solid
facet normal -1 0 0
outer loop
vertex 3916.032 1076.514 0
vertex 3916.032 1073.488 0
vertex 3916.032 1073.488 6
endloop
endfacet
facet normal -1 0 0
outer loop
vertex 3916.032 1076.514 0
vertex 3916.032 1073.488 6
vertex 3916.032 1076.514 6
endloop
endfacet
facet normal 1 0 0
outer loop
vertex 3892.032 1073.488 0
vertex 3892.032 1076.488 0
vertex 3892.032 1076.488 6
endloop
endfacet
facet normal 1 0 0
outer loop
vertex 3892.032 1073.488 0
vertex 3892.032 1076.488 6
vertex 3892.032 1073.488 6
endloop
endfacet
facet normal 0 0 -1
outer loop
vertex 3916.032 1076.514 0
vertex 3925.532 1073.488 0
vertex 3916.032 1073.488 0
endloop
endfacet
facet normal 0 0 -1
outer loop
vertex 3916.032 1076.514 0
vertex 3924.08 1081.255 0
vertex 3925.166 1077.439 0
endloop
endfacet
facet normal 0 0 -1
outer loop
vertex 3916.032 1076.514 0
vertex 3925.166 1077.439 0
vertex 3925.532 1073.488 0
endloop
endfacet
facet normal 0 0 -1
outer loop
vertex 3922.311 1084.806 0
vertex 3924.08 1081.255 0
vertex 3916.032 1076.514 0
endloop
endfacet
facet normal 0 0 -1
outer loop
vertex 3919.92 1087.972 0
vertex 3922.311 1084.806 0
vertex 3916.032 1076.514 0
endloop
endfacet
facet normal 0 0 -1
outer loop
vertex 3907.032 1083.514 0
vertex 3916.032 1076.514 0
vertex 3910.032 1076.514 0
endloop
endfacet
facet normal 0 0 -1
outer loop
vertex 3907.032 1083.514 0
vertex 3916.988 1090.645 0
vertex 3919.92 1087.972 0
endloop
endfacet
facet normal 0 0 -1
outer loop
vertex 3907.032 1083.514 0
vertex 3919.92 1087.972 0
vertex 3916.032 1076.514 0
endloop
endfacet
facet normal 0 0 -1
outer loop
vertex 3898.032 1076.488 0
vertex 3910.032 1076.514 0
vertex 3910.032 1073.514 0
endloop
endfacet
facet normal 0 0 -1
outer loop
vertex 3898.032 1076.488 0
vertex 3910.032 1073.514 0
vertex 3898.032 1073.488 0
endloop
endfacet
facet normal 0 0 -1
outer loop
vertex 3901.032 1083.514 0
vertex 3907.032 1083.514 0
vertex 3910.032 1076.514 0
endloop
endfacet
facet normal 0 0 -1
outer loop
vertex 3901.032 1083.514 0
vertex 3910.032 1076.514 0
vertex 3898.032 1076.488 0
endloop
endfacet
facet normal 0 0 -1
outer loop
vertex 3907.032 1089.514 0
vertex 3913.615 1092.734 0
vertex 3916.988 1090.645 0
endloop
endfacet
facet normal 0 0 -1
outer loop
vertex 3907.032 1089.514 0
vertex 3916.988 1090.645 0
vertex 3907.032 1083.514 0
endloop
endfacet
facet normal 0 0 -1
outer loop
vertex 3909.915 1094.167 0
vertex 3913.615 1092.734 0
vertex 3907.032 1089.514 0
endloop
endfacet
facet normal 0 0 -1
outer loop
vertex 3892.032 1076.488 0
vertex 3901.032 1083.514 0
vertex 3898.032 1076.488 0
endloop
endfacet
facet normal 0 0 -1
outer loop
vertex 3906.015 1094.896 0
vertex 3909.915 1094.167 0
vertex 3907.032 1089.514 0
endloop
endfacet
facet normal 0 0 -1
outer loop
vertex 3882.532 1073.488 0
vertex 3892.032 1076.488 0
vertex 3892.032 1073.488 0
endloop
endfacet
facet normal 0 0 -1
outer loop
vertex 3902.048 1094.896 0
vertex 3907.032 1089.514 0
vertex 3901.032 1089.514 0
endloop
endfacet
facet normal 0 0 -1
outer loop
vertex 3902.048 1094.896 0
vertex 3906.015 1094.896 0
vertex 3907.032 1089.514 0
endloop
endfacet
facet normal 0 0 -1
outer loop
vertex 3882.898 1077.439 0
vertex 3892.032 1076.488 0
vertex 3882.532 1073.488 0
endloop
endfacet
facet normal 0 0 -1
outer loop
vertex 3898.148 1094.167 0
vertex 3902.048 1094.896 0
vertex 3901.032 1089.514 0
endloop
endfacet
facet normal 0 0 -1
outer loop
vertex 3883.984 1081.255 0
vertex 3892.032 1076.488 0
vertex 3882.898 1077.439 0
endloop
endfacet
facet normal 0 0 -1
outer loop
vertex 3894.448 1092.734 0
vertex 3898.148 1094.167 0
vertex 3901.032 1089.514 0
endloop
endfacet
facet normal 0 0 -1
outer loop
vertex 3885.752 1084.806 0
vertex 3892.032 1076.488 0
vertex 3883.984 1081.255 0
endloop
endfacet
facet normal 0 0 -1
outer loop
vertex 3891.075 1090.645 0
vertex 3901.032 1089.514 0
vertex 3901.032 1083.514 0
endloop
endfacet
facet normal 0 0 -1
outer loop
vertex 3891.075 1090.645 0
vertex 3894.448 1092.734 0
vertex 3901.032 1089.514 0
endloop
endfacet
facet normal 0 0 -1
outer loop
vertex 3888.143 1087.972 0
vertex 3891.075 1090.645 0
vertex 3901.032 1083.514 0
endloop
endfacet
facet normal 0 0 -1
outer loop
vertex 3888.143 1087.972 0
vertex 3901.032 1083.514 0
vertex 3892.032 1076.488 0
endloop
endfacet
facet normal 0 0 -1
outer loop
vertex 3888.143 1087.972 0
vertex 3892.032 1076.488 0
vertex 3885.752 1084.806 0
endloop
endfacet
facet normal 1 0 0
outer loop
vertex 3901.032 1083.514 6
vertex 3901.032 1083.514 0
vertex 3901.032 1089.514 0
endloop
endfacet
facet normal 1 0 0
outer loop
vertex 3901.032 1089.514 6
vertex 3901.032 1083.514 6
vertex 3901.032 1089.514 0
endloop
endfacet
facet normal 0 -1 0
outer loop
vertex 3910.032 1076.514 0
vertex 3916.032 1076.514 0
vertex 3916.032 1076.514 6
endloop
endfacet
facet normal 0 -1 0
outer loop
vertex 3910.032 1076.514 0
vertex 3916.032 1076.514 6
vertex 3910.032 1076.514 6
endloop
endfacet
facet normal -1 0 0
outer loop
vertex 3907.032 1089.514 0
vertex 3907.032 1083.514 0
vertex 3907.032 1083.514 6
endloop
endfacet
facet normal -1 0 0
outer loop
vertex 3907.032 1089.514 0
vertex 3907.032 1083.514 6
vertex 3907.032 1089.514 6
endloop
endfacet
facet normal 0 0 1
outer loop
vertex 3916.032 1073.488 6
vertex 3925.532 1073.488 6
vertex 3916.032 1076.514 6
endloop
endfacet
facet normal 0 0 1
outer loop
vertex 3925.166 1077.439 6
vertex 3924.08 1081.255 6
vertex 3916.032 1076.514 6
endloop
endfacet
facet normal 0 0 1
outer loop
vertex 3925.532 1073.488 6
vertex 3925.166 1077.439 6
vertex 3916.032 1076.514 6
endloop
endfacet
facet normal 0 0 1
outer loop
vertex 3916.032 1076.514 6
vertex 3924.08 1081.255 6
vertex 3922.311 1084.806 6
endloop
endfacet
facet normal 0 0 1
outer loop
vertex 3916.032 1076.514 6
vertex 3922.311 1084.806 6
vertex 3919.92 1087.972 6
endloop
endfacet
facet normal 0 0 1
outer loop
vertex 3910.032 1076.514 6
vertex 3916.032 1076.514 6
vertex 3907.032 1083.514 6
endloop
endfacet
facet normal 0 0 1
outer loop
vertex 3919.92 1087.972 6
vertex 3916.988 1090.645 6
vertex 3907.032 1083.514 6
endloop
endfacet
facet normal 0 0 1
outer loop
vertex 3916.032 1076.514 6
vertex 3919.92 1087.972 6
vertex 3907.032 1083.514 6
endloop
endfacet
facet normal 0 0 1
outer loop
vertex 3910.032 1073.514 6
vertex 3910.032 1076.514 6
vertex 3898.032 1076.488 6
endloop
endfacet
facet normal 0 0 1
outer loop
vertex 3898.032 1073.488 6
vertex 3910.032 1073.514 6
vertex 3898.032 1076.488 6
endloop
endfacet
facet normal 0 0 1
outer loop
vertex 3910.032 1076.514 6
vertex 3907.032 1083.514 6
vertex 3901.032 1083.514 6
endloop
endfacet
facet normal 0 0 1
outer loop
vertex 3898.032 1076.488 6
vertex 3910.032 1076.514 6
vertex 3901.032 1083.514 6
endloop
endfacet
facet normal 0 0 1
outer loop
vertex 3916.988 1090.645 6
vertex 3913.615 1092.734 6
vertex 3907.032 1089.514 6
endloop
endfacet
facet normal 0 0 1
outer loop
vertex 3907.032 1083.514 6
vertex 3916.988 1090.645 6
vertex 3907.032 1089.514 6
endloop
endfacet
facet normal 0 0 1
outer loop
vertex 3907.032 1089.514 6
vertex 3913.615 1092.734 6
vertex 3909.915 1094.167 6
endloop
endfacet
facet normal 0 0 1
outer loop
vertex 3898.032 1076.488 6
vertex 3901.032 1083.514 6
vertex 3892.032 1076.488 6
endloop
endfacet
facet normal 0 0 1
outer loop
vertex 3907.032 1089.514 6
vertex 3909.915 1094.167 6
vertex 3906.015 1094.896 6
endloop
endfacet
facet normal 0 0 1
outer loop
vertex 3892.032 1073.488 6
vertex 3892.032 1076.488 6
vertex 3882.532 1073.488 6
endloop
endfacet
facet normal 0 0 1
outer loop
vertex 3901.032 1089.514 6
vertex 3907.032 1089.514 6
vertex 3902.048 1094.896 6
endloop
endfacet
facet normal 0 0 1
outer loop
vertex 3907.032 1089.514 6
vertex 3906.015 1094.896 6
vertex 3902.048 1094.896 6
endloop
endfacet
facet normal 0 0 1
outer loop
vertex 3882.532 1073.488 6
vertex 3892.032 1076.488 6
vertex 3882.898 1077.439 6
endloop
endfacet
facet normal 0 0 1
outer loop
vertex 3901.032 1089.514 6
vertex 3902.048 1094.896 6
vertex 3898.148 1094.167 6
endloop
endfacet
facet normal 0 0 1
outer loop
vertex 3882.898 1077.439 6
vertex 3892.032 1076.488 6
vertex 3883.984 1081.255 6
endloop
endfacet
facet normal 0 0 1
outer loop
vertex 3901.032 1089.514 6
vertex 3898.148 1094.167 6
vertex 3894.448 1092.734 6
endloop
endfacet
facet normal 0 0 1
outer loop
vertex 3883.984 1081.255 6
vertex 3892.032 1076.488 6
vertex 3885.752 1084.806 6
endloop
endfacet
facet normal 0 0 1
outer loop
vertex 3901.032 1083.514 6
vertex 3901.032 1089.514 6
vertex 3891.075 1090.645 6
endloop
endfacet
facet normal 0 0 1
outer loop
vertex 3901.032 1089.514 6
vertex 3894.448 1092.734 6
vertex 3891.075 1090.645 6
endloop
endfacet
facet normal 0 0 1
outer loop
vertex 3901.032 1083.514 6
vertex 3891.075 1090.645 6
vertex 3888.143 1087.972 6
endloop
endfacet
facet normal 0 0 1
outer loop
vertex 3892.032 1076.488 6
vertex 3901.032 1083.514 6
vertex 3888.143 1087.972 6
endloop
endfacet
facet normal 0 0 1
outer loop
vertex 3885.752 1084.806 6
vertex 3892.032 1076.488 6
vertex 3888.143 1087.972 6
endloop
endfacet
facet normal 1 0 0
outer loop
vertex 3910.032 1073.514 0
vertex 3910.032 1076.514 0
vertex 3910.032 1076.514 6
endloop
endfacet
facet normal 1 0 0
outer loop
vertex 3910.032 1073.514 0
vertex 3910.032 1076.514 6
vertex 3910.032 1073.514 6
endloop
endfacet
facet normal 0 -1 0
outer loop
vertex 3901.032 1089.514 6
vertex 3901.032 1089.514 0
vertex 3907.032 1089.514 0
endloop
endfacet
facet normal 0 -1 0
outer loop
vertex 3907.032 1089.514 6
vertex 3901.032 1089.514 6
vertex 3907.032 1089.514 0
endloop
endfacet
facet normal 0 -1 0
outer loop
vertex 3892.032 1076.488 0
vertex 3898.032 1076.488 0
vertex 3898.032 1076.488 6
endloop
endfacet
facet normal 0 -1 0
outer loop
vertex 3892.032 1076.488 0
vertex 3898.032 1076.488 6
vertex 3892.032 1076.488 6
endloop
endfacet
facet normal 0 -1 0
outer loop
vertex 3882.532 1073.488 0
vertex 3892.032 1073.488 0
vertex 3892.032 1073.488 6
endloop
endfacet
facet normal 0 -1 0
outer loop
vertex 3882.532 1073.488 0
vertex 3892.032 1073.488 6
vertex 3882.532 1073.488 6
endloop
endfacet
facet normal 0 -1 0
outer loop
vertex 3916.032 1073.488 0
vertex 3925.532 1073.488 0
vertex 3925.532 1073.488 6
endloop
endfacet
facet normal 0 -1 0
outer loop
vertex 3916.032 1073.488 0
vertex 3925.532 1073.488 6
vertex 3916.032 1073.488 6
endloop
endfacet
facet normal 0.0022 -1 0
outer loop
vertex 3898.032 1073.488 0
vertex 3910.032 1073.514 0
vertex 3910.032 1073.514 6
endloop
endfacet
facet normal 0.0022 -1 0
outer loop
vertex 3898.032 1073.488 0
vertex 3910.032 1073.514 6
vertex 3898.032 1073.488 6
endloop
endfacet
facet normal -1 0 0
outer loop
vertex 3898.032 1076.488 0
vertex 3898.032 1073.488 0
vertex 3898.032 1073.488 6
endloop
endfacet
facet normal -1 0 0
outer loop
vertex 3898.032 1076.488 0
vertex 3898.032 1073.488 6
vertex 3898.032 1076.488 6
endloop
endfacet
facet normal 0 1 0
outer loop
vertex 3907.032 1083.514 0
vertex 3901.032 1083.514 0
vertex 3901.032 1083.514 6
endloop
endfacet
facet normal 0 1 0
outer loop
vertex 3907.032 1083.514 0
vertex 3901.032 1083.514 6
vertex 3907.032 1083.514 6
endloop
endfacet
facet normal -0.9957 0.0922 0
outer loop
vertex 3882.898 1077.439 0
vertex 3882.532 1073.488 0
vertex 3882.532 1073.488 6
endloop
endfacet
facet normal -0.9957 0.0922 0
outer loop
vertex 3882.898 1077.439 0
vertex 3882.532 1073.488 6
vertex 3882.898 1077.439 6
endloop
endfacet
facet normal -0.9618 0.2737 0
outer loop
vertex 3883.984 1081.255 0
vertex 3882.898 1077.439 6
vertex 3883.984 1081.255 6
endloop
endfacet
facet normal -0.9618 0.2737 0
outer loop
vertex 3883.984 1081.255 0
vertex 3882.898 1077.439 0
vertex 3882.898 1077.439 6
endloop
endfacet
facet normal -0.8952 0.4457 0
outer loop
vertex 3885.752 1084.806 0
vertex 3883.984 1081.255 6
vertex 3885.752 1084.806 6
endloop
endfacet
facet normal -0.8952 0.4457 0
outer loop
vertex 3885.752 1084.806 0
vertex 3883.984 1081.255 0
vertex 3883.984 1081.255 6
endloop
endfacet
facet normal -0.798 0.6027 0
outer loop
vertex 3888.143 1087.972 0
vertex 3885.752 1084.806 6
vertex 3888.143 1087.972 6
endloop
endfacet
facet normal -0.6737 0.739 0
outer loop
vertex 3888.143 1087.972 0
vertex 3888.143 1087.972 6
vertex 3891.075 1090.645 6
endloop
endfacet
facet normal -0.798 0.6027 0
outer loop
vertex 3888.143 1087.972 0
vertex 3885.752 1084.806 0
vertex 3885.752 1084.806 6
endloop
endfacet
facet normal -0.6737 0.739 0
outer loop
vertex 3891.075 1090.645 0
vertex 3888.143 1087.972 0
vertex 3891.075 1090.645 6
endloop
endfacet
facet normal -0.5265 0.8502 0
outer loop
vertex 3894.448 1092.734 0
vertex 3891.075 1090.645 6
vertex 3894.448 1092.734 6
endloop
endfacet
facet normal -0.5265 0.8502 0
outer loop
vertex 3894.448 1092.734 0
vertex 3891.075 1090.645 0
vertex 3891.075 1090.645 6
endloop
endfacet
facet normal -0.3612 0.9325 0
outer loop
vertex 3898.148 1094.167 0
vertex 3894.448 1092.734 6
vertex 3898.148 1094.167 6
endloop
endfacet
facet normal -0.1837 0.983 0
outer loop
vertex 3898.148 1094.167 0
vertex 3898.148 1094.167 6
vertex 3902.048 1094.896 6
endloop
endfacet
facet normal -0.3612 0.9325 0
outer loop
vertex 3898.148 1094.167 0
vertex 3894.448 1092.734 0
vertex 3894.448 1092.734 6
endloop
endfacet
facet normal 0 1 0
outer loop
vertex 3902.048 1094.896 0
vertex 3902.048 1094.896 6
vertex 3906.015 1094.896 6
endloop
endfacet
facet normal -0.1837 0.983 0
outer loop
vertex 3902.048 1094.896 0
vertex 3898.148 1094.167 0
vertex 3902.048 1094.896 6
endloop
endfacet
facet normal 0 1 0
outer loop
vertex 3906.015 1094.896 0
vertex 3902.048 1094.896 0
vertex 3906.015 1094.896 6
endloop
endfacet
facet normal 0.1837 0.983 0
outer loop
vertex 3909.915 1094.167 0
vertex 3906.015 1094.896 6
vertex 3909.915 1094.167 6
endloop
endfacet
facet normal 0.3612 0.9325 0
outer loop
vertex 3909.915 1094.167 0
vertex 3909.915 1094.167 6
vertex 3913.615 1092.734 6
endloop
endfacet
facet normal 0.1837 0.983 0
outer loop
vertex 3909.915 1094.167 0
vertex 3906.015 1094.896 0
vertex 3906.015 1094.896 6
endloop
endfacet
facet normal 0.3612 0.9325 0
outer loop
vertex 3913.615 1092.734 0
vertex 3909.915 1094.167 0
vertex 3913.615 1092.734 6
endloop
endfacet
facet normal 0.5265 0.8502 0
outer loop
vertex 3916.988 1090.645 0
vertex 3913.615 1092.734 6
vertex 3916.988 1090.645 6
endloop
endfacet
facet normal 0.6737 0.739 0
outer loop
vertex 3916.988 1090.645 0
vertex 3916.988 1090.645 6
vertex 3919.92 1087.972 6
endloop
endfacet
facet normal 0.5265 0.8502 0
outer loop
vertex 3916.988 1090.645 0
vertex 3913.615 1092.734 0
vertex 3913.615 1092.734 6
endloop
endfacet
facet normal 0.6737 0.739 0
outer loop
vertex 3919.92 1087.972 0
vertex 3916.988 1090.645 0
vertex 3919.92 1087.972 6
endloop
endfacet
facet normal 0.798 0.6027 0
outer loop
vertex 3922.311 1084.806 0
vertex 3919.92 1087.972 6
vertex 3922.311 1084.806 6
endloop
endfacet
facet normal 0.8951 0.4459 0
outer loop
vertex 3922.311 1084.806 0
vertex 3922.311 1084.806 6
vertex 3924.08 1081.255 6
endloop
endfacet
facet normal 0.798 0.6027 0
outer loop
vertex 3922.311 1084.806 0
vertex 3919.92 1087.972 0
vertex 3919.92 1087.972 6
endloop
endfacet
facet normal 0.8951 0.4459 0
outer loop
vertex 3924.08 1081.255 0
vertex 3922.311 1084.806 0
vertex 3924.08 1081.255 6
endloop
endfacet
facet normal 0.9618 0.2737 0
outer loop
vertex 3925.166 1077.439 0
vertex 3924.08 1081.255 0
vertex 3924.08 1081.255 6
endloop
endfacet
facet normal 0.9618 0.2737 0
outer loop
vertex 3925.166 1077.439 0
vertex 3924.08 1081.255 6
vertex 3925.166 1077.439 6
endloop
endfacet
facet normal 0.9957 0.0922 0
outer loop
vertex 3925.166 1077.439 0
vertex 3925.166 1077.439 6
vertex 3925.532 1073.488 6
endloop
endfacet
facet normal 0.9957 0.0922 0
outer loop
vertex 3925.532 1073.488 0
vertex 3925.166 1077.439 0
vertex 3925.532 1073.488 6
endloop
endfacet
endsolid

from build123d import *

# Parameters (mm, degrees)
MODEL_W             = 6
MODEL_H             = 6
BOSS_EXTRUDE1_DEPTH = 6


with BuildPart() as part:
    # Model → Boss-Extrude1 (new body)
    with BuildSketch(Plane.XY):
        with BuildLine():
            Line((3925.531656445, 1073.487893097), (3916.031656445, 1073.487893097))
            Line((3916.031656445, 1073.487893097), (3916.0316001, 1076.513895594))
            Line((3916.0316001, 1076.513895594), (3910.0316001, 1076.513895594))
            Line((3910.0316001, 1076.513895594), (3910.0316001, 1073.513895594))
            Line((3910.0316001, 1073.513895594), (3898.031656445, 1073.487893097))
            Line((3898.031656445, 1073.487893097), (3898.031656445, 1076.487893097))
            Line((3898.031656445, 1076.487893097), (3892.031656445, 1076.487893097))
            Line((3892.031656445, 1076.487893097), (3892.031656445, 1073.487893097))
            Line((3892.031656445, 1073.487893097), (3882.531656445, 1073.487893097))
            ThreePointArc((3882.531656445, 1073.487893097), (3904.031656445, 1094.987893097), (3925.531656445, 1073.487893097))
        make_face()
        with Locations((3904.0316001, 1086.513895594)):
            Rectangle(MODEL_W, MODEL_H, mode=Mode.SUBTRACT)
    extrude(amount=BOSS_EXTRUDE1_DEPTH)


solid = part.part
